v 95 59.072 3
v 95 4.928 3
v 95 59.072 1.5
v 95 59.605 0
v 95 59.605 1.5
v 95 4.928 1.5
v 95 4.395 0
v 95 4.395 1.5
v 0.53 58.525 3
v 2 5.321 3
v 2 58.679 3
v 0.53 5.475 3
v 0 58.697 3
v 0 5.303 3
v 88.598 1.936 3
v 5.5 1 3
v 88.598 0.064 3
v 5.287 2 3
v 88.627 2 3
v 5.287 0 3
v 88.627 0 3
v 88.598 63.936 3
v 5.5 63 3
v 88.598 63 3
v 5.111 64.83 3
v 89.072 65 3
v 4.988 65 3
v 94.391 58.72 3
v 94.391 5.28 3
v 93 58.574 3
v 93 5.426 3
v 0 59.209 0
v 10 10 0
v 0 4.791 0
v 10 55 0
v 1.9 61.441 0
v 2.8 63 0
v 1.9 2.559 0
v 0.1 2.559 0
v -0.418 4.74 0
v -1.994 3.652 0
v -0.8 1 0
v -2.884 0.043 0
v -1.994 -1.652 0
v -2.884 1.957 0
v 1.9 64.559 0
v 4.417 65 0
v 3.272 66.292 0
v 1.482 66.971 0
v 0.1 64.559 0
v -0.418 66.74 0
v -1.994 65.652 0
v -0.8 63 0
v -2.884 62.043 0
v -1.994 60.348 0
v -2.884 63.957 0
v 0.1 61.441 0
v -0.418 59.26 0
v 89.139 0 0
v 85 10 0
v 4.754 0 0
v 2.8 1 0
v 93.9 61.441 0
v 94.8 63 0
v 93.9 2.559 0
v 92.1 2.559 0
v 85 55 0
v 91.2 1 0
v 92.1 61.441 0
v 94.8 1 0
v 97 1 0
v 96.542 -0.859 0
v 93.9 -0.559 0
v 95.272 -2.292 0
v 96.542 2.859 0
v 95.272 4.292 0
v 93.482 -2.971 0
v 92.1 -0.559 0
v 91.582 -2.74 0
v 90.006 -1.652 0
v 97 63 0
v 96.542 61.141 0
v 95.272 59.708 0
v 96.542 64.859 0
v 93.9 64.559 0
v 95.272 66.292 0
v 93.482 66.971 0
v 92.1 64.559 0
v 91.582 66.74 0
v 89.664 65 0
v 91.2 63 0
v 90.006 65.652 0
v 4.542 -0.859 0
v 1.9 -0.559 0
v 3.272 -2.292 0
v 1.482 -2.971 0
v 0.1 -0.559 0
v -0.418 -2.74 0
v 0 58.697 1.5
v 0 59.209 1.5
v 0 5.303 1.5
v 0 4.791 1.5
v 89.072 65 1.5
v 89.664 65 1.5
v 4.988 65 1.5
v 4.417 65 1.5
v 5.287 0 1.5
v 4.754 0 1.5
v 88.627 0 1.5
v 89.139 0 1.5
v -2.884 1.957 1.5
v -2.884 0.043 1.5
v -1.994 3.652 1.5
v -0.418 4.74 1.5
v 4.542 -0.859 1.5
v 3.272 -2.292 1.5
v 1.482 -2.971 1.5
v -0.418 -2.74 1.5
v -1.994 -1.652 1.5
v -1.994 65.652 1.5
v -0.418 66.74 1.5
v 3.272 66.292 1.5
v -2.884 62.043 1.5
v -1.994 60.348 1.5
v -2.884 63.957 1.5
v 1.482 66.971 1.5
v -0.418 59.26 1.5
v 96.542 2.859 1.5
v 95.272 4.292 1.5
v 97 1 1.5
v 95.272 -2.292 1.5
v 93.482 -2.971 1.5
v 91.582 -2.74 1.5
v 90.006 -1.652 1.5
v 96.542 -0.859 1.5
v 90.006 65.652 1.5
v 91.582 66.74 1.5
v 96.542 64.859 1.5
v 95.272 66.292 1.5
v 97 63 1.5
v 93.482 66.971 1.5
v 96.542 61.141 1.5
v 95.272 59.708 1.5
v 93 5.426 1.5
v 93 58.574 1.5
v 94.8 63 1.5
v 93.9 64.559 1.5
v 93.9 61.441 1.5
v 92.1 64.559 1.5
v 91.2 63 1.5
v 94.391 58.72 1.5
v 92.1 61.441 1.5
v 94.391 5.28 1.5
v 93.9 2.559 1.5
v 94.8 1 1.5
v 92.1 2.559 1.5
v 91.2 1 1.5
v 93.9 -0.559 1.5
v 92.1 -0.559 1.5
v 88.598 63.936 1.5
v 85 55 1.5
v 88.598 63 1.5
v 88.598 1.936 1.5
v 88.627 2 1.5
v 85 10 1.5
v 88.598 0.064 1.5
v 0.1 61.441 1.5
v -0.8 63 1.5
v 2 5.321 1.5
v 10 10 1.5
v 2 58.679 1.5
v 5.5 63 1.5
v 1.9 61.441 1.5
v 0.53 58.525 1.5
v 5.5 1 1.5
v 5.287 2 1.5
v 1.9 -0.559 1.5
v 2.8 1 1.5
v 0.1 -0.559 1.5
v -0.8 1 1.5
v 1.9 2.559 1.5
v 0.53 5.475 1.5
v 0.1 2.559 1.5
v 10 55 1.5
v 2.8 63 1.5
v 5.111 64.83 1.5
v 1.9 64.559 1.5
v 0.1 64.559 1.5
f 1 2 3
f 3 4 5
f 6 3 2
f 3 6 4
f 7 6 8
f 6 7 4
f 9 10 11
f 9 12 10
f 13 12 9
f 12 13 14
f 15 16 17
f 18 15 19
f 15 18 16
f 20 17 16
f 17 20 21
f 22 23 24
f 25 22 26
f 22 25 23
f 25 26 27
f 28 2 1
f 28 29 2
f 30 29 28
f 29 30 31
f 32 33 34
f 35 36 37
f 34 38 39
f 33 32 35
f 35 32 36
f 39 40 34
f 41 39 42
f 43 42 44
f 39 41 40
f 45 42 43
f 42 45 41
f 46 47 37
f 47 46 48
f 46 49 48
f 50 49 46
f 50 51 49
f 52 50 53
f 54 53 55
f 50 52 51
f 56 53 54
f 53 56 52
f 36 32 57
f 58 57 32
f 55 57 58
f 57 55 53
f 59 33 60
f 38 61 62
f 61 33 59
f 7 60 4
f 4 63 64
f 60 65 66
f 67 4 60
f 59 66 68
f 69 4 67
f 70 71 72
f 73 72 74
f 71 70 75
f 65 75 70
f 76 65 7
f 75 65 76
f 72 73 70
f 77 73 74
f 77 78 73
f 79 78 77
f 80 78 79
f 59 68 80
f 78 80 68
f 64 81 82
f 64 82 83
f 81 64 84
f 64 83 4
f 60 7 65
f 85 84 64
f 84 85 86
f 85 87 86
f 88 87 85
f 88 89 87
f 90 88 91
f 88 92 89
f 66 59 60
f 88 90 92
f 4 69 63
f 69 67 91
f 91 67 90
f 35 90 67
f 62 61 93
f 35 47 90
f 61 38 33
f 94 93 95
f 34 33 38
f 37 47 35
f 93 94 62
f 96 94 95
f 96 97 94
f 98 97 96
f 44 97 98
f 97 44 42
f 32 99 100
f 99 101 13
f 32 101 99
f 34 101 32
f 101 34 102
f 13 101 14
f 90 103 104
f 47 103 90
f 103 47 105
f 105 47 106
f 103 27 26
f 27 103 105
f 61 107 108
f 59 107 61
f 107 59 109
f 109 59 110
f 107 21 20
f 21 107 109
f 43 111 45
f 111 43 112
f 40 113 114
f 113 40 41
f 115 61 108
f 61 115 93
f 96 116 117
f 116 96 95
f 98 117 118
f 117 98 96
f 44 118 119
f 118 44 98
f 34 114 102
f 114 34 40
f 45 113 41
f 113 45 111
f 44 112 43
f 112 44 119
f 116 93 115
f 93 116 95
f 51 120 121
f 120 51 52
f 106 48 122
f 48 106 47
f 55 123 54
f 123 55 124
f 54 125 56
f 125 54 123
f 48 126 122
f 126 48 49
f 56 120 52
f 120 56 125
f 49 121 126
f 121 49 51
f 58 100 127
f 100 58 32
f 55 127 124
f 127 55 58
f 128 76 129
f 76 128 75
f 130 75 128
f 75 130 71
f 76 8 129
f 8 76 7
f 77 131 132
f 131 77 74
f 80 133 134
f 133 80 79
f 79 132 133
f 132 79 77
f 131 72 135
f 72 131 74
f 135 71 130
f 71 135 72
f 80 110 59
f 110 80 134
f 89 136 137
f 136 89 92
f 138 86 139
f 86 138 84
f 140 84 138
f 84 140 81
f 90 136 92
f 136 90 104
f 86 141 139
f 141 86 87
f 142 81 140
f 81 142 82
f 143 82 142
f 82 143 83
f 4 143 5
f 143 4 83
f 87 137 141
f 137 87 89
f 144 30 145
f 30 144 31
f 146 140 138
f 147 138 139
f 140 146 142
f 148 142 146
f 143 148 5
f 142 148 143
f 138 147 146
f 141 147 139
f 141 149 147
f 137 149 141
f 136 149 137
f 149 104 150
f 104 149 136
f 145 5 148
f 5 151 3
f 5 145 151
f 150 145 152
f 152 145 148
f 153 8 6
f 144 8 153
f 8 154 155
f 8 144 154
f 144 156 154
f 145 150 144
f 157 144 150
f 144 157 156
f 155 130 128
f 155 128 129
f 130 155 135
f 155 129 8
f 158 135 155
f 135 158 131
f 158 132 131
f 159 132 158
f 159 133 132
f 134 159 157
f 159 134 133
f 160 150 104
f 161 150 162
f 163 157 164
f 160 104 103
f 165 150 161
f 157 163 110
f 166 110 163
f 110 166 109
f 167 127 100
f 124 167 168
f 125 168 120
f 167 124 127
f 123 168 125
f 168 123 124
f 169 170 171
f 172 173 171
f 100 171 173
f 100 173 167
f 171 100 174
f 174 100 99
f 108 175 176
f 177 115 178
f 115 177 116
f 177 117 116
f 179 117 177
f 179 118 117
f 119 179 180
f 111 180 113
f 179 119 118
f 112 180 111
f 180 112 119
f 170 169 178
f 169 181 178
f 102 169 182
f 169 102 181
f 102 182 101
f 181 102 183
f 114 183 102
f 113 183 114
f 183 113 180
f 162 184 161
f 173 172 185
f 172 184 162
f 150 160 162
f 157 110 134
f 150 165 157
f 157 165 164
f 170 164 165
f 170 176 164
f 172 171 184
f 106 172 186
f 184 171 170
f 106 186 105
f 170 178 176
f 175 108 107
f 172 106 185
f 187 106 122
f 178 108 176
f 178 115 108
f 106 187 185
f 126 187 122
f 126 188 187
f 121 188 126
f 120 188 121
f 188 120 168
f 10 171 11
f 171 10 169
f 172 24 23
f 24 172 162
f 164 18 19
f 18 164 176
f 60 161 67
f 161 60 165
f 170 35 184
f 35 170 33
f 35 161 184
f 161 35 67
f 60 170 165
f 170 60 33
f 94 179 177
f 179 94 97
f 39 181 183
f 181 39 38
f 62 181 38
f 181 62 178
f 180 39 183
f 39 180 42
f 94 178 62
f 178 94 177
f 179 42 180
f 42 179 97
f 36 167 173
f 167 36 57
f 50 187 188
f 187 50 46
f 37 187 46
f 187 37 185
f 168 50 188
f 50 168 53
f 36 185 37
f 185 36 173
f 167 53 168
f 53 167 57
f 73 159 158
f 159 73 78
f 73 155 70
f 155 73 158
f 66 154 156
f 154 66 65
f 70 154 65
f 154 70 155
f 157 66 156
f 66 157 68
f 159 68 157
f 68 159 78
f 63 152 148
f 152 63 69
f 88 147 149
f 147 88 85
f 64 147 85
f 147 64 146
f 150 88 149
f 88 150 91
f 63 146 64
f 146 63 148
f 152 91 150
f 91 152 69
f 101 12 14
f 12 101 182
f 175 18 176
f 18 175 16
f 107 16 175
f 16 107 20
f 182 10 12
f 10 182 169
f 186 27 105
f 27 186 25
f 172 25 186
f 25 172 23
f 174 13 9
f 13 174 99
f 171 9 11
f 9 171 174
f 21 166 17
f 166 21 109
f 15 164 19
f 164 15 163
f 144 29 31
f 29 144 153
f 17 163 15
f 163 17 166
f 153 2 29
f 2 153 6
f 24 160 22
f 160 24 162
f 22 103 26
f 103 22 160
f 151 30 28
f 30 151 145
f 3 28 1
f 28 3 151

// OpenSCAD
//pcb-bottom=5mm
module shit()
{
length=85-2;

difference()
{
union()
{
translate([-3,0,0])cube([length+3+3,25,3]);
translate([-4,0,4])rotate([-90,0,0])cylinder(r=4,h=25);
translate([length+4,0,4])rotate([-90,0,0])cylinder(r=4,h=25);
//translate([-1,2,2])cube([87,3,2]);
//translate([-1,2+3*1.6,2])cube([87,3,2]);
}
translate([-4,15,4])rotate([-90,0,0])cylinder(r=1.8,h=40,center=true);
translate([length+4,15,4])rotate([-90,0,0])cylinder(r=1.8,h=40,center=true);

translate([-10,12.5-20,-1])cube([10,20,10]);
translate([length,12.5,-1])cube([10,20,10]);
translate([0,5,-1])cube([length,1.6,2])

translate([64.6,(5+7.7+0.3),-10])cylinder(r=3.7,h=20);
//translate([64.6,5+7.7,3])cylinder(r=9,h=20);
translate([45.6,5+9.25,-10])cylinder(r=9.5/2,h=20);

}
}

boardlength = 85;
height=25;
thickness=3;
groovedepth=1;
groovewidth=1.6;
basetobottom=5;
dcylinder=8;
dbore=3.6;
boardwidth=56;

module sides()
{

difference()
{

	union()
	{
		translate([-thickness,0,0])cube([boardlength+2*thickness,height,thickness]);
		translate([-dcylinder/2,0,dcylinder/2])rotate([-90,0,0])cylinder(r=dcylinder/2,h=25);
		translate([83+dcylinder/2,0,dcylinder/2])rotate([-90,0,0])cylinder(r=4,h=25);


	}

	translate([0,basetobottom,-1])cube([boardlength,groovewidth,groovedepth+1]);
	translate([-10,-1,0]) cube([10,13.5,10]);
	translate([83,13.5-1,0]) cube([10,13.5,10]);


	translate([-4,15,4])rotate([-90,0,0])cylinder(r=1.8,h=40,center=true);
	translate([83+4,15,4])rotate([-90,0,0])cylinder(r=1.8,h=40,center=true);


//translate([85-64.6-1,(5+7.7+0.3),-10])cylinder(r=3.7,h=20);
//translate([85-64.6-1,5+7.7,-18.5])cylinder(r=9,h=20);
//translate([85-45.6-1,5+9.25,-10])cylinder(r=9.5/2,h=20);


//HDMI: translate([36.7+7.5-10-1,5-0.75+1.6,-1])cube([20,9,20]);
//cable thing next to HDMI: translate([58,5+8.5,-8.5])cylinder(r=3.5,h=10);
}



}

module sides()
{
difference()
{

	union()
	{
		translate([-thickness,0,0])cube([boardwidth+2*thickness,height,thickness]);
		translate([-dcylinder/2,0,dcylinder/2])rotate([-90,0,0])cylinder(r=dcylinder/2,h=25);
		translate([boardwidth-2+dcylinder/2,0,dcylinder/2])rotate([-90,0,0])cylinder(r=4,h=25);


	}

	translate([0,basetobottom,-1])cube([boardwidth,groovewidth,groovedepth+1]);
	translate([-10,-1,0]) cube([10,13.5,10]);
	translate([boardwidth-2,13.5-1,0]) cube([10,13.5,10]);


	translate([-4,15,4])rotate([-90,0,0])cylinder(r=1.8,h=40,center=true);
	translate([boardwidth-2+4,15,4])rotate([-90,0,0])cylinder(r=1.8,h=40,center=true);


//sd and power side :)
//	translate([25.75-13-1,5-3.95,-5])cube([26,4.5,10]);
//	translate([48.35-6.5-1,5+1.95-4.5,-5])cube([13,9,10]);

	translate([10.22-8.5-1,7.98+5-7,0])cube([17,14,20]);
	translate([23.85+7.15-8,5+7.7+2.04-8,0])cube([15,16,20]);


}

}

module base()
{
	difference()
	{
		union()
		{
			cube([91+4,61+4,3]);
			translate([1,1,0])cylinder(r=4,h=3);
			translate([1,60+4-1,0])cylinder(r=4,h=3);
			translate([90+4-1,1,0])cylinder(r=4,h=3);
			translate([90+4-1,60+4-1,0])cylinder(r=4,h=3);
		}
		translate([2,2,1.5])cube([91,61,1.5+1]);

		translate([(91+4-75)/2,(61+4-45)/2,-2])cube([75,45,10]);

			translate([1,1,-1])cylinder(r=1.8,h=10);
			translate([1,60+4-1,-1])cylinder(r=1.8,h=10);
			translate([90+4-1,1,-1])cylinder(r=1.8,h=10);
			translate([90+4-1,60+4-1,-1])cylinder(r=1.8,h=10);


			translate([1,1,1.5])cylinder(r=4.5,h=3);
			translate([1,60+4-1,1.5])cylinder(r=4.5,h=3);
			translate([90+4-1,1,1.5])cylinder(r=4.5,h=3);
			translate([90+4-1,60+4-1,1.5])cylinder(r=4.5,h=3);



	}
}

base();
